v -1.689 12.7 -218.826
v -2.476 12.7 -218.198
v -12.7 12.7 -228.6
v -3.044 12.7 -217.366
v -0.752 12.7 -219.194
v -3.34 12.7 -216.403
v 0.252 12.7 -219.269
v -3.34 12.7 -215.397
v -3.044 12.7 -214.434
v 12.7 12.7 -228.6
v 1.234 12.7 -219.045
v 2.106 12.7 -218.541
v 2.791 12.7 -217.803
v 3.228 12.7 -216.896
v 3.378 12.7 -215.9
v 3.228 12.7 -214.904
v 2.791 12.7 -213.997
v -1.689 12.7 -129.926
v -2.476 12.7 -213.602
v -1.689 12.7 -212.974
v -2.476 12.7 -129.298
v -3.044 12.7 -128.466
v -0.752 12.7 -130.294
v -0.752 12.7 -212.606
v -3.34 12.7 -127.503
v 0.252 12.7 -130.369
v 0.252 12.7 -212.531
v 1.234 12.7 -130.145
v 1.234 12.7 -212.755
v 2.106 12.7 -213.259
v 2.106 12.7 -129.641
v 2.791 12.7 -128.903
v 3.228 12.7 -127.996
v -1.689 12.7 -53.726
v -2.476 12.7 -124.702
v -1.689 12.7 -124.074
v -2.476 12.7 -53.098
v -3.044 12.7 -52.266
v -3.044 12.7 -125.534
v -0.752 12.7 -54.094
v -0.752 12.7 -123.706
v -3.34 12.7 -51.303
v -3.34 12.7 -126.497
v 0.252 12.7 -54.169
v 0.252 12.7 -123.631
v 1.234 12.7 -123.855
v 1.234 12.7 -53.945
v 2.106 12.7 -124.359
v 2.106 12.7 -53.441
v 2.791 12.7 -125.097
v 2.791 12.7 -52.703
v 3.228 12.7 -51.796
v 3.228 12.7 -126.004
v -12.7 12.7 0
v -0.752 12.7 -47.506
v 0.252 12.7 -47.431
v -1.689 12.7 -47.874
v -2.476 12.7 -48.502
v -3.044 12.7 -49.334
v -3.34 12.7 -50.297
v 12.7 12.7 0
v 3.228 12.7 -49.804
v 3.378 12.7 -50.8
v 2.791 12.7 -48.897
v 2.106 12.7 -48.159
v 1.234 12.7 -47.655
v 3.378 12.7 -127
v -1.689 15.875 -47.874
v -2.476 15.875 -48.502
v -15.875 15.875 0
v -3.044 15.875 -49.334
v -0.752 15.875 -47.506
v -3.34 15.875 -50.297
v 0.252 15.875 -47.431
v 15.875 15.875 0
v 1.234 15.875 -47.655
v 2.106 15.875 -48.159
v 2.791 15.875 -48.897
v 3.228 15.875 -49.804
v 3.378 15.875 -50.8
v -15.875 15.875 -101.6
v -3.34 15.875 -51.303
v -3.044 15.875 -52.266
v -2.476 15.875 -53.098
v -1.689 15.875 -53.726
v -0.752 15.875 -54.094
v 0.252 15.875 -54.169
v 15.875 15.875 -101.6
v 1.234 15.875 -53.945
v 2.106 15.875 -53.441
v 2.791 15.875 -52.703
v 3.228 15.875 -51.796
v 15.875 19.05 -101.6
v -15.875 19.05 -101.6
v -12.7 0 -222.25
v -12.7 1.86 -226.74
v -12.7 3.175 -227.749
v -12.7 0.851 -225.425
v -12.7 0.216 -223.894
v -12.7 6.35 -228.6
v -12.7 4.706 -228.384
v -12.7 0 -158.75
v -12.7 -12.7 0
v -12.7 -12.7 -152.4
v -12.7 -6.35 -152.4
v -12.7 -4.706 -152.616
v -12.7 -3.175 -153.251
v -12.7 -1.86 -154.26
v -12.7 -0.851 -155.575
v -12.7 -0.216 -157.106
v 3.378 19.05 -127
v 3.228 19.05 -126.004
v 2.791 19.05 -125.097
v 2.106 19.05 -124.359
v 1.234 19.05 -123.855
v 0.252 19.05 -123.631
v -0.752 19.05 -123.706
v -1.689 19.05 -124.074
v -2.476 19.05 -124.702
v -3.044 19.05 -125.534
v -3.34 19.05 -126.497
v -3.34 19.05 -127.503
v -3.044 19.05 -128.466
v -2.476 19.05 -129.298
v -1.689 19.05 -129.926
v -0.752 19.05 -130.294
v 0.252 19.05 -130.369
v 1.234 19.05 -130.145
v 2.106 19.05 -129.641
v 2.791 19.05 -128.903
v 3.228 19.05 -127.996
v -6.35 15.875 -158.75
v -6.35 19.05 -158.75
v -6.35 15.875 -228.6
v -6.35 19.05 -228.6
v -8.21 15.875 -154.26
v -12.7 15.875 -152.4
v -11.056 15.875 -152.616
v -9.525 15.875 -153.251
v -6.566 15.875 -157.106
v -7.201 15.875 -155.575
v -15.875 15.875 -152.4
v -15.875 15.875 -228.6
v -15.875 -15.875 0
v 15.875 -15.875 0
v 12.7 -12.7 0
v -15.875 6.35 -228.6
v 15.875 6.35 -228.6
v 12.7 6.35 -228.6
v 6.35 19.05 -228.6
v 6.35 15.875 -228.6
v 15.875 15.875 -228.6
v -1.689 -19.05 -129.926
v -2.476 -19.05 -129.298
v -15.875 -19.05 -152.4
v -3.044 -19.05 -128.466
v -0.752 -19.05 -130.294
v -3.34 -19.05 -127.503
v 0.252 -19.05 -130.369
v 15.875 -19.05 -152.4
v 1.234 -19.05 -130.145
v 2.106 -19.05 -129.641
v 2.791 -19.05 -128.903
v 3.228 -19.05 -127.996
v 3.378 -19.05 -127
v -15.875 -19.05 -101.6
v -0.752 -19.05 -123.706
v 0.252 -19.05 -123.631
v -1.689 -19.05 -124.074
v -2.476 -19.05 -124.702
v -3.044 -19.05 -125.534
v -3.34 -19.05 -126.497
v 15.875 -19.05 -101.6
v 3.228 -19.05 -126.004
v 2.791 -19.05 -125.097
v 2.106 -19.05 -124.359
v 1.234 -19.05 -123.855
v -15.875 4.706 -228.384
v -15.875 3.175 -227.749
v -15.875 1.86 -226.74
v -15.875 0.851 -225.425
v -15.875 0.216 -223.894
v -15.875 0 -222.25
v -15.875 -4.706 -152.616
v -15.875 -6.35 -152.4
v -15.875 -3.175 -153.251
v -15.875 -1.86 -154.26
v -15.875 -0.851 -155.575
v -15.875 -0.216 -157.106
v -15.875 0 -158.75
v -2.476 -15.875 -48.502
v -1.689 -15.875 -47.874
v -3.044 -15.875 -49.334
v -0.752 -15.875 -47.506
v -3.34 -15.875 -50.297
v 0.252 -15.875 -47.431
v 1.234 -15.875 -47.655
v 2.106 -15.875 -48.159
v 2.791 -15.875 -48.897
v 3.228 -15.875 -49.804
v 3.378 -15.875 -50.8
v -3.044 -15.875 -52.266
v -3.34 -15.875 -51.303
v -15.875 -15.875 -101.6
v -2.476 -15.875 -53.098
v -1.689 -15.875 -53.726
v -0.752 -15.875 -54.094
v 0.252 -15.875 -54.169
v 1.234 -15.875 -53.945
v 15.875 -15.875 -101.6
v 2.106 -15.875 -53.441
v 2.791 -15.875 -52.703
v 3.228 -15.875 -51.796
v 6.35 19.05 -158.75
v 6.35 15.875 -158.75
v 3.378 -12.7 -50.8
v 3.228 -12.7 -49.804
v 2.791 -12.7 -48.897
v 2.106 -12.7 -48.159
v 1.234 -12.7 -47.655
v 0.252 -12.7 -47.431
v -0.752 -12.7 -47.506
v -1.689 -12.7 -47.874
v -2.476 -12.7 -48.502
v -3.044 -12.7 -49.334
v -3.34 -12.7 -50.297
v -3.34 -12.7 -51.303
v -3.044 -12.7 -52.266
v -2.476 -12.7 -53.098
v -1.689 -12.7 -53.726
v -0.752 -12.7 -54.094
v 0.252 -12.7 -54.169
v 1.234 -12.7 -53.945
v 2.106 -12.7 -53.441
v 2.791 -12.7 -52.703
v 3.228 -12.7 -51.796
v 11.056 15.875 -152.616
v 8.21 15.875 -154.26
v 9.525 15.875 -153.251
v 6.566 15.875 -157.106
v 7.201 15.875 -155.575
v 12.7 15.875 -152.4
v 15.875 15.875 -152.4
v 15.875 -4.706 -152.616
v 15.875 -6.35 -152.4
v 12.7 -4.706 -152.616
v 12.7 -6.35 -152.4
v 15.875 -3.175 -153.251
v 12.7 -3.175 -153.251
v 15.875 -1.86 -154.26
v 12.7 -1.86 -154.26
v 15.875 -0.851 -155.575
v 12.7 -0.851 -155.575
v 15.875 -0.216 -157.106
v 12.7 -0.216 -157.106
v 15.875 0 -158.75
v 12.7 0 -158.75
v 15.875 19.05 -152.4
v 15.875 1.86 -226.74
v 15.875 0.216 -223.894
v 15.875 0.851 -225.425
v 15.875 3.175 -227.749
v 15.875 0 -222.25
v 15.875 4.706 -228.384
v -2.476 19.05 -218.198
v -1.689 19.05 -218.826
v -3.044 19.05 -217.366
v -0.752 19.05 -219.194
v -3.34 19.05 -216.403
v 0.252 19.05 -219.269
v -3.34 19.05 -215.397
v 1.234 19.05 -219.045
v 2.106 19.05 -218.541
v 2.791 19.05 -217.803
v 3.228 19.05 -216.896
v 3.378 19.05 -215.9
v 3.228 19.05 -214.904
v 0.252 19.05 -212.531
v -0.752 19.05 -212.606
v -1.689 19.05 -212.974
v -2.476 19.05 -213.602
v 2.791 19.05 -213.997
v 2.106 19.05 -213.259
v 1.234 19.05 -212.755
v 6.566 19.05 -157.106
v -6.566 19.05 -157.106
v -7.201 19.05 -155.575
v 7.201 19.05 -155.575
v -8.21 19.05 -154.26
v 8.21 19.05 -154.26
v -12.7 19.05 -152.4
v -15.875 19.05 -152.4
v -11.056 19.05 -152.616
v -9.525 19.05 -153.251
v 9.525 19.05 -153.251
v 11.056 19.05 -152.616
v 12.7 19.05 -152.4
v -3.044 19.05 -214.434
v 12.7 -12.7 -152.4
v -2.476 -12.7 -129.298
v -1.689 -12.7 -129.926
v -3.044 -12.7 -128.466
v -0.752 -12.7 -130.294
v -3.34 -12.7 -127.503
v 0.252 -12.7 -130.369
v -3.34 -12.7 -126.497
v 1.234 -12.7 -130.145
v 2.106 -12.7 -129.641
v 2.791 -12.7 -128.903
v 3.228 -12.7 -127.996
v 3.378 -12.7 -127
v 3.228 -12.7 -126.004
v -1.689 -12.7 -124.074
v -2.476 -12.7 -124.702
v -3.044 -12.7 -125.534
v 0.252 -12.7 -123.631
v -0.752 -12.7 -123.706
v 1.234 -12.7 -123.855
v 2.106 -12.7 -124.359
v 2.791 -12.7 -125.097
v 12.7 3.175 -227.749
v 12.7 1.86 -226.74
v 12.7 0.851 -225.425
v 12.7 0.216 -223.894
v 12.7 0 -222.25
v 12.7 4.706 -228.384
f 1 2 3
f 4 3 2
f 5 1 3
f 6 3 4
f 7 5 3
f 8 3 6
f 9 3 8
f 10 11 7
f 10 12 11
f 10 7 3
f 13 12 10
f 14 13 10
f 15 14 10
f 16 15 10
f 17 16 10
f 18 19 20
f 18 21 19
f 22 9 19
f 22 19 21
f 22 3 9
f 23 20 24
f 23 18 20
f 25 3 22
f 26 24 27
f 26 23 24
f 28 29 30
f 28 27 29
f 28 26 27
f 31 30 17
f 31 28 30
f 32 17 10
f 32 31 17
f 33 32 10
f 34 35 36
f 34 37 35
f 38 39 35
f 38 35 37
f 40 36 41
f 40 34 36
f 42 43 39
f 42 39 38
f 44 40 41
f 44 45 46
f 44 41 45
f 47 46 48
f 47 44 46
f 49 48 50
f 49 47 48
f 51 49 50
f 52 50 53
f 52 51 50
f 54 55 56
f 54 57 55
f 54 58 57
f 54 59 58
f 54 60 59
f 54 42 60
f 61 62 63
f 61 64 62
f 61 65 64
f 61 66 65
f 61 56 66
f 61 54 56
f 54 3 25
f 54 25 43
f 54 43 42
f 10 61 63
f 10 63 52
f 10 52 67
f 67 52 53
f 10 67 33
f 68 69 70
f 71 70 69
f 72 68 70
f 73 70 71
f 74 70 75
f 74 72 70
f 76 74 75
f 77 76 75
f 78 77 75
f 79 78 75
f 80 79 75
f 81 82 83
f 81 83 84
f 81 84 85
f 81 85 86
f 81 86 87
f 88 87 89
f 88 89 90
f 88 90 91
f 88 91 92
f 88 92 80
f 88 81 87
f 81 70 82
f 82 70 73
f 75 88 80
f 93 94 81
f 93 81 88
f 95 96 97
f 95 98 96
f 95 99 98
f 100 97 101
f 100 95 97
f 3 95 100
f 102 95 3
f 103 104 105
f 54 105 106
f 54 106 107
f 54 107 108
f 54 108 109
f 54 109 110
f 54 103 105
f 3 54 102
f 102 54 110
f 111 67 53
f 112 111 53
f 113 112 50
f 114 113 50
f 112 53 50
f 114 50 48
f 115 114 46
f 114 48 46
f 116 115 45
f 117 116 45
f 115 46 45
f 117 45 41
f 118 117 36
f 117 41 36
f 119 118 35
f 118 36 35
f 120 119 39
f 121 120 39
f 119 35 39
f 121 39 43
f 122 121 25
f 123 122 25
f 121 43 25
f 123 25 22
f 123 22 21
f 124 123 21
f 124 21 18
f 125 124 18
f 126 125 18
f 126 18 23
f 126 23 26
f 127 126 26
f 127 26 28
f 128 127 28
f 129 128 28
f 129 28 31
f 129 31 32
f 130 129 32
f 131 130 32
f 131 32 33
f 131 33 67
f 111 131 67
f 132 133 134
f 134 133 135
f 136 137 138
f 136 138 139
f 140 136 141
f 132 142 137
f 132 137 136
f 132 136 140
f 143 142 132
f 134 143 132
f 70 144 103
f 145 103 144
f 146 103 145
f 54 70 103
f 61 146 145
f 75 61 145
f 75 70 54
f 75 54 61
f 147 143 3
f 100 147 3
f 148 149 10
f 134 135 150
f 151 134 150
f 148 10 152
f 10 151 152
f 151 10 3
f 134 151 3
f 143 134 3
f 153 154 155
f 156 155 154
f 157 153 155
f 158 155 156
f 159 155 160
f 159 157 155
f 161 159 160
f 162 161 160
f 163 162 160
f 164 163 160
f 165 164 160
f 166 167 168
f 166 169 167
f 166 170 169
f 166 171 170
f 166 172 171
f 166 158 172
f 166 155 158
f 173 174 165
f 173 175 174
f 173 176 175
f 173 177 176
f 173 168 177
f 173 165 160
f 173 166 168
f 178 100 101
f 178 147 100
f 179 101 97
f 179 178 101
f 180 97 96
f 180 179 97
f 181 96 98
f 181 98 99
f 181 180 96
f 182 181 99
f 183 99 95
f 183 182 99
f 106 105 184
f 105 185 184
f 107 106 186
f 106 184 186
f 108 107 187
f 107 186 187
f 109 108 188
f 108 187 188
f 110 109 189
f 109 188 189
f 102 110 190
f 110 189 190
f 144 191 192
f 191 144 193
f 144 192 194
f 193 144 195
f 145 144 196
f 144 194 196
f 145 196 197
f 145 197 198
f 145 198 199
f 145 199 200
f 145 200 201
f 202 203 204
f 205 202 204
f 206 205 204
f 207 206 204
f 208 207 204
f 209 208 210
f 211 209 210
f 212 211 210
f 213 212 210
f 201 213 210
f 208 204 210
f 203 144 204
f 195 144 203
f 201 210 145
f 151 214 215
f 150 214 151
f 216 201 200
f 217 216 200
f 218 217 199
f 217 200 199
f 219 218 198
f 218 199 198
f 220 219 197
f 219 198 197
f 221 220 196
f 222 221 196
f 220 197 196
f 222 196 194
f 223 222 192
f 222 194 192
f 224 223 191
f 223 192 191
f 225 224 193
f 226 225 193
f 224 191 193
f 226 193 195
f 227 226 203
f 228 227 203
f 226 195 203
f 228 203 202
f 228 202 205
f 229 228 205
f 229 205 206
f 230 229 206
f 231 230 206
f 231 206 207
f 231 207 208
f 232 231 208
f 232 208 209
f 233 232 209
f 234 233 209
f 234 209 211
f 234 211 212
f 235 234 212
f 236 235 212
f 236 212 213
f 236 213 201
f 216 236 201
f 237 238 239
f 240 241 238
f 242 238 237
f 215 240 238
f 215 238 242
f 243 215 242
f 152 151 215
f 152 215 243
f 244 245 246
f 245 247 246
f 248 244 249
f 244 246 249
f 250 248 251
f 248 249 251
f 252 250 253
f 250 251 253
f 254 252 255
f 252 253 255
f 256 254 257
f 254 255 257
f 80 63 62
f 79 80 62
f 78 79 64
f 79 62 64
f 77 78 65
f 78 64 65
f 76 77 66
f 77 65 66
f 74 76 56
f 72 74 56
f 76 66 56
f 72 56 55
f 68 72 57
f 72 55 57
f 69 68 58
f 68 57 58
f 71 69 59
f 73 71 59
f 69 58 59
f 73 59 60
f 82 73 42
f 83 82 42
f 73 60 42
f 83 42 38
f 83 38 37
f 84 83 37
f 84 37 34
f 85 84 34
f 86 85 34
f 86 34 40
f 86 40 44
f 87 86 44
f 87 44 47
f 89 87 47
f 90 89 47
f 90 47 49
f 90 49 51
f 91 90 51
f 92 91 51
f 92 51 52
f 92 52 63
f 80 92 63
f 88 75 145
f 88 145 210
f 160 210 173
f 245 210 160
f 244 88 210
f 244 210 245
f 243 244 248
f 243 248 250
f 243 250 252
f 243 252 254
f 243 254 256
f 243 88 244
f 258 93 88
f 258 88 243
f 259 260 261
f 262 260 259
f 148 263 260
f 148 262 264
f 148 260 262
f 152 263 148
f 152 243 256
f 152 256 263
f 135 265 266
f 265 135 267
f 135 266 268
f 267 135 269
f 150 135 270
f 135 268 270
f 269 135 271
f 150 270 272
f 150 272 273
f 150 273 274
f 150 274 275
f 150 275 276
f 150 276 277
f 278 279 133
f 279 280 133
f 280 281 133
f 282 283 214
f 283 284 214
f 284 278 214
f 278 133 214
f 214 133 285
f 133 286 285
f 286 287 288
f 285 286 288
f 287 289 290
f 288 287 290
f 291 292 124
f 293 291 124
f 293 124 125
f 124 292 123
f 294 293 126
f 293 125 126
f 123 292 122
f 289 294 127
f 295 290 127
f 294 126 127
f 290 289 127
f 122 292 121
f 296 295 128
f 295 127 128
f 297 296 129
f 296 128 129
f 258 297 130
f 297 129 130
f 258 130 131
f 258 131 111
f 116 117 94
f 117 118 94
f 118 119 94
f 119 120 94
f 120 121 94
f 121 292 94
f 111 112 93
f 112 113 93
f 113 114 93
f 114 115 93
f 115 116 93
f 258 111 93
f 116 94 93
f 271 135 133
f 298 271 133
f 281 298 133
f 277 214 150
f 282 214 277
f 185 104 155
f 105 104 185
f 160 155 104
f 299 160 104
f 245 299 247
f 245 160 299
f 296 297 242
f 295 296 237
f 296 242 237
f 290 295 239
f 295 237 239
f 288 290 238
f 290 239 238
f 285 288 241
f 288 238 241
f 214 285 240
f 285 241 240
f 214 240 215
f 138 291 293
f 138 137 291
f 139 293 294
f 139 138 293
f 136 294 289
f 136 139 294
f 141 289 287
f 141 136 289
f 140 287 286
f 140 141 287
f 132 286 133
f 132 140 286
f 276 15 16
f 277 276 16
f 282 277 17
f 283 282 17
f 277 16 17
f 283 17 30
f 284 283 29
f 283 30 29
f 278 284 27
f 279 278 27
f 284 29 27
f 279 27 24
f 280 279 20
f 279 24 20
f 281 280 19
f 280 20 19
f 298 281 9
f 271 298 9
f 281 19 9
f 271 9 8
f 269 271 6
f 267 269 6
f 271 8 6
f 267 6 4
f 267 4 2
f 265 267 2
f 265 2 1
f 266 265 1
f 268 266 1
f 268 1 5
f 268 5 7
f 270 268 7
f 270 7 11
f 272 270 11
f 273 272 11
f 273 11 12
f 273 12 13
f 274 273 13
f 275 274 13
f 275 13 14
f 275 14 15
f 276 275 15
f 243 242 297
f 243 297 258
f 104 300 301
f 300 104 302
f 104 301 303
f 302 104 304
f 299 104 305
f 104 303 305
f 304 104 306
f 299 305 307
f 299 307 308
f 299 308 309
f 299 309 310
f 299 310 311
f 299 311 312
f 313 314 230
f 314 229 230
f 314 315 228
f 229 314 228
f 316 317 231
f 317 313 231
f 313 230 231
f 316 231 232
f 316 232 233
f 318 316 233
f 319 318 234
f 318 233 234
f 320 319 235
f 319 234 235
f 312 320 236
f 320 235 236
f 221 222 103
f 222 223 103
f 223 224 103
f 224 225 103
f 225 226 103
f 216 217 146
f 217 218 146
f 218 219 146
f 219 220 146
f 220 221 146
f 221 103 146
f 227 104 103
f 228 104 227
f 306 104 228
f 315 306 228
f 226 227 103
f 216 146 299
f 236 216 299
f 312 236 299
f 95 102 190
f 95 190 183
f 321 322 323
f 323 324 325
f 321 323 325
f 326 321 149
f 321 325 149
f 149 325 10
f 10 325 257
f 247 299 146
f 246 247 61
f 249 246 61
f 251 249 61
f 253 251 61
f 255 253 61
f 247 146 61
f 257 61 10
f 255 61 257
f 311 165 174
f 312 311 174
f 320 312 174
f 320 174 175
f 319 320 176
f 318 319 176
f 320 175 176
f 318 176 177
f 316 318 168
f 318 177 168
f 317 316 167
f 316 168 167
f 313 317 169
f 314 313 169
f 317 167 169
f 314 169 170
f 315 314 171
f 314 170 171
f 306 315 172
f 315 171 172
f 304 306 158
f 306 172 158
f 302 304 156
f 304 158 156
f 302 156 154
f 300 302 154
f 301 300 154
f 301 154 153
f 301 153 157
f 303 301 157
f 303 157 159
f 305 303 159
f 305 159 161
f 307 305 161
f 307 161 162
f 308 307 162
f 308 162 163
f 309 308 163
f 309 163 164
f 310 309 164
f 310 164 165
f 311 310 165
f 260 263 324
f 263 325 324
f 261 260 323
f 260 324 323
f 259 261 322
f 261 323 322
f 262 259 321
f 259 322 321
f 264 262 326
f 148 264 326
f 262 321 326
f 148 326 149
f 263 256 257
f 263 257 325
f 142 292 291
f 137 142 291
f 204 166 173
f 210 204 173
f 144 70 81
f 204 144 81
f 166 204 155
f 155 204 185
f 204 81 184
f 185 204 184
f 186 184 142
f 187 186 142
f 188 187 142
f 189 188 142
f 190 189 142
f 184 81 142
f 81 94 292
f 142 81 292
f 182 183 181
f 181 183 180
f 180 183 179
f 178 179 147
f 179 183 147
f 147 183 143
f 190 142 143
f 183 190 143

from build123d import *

# Parameters (mm, degrees)
SKETCH1_W               = 38.1
SKETCH1_H               = 38.1
SKETCH1_W_2             = 25.4
SKETCH1_H_2             = 25.4
EXTRUDE1_DEPTH          = 228.6
F_1_4_CLEARANCE_HOLE1_D = 6.7564
SKETCH4_W               = 12.7
SKETCH4_H               = 76.2
SKETCH4_W_2             = 38.1
SKETCH4_H_2             = 101.6
EXTRUDE2_DEPTH          = 3.175
SKETCH5_W               = 228.6
SKETCH5_H               = 38.1
EXTRUDE3_DEPTH          = 3.175
FILLET2_R               = 6.35
SKETCH8_W               = 76.2
SKETCH8_H               = 19.05
EXTRUDE6_DEPTH          = 232.579198116
FILLET3_R               = 6.35
FILLET4_R               = 6.35


with BuildPart() as part:
    # Sketch1 → Extrude1 (new body)
    with BuildSketch(Plane.XY):
        Rectangle(SKETCH1_W, SKETCH1_H)
        Rectangle(SKETCH1_W_2, SKETCH1_H_2, mode=Mode.SUBTRACT)
    extrude(amount=-EXTRUDE1_DEPTH)

    # 1/4 Clearance Hole1 (through all)
    with Locations(Plane(origin=(0, 19.05, 0), x_dir=(-1, 0, 0), z_dir=(0, 1, 0))):
        with Locations((0, -215.9), (0, -50.8), (0, -127)):
            Hole(F_1_4_CLEARANCE_HOLE1_D / 2)

    # Sketch4 → Extrude2 (cut)
    with BuildSketch(Plane(origin=(0, 19.05, 0), x_dir=(1, 0, 0), z_dir=(0, 1, 0))):
        with Locations((-12.7, 190.5)):
            Rectangle(SKETCH4_W, SKETCH4_H)
        with Locations((0, 50.8)):
            Rectangle(SKETCH4_W_2, SKETCH4_H_2)
        with Locations((12.7, 190.5)):
            Rectangle(SKETCH4_W, SKETCH4_H)
    extrude2 = extrude(amount=-EXTRUDE2_DEPTH, mode=Mode.SUBTRACT)

    # Mirror1: Extrude2 across plane
    add(extrude2.mirror(Plane.ZX), mode=Mode.SUBTRACT)

    # Sketch5 → Extrude3 (cut)
    with BuildSketch(Plane(origin=(19.05, 0, 0), x_dir=(0, 0, -1), z_dir=(1, 0, 0))):
        with Locations((114.3, 0)):
            Rectangle(SKETCH5_W, SKETCH5_H)
    extrude3 = extrude(amount=-EXTRUDE3_DEPTH, mode=Mode.SUBTRACT)

    # Mirror2: Extrude3 across plane
    add(extrude3.mirror(Plane(origin=(0, 0, 0), x_dir=(0, 0, 1), z_dir=(1, 0, 0))), mode=Mode.SUBTRACT)

    # Fillet2
    fillet2_edges = [part.edges().sort_by_distance(p)[0] for p in [
        (-6.35, 17.4625, -152.4),
        (6.35, 17.4625, -152.4),
    ]]
    fillet(fillet2_edges, radius=FILLET2_R)

    # Sketch8 → Extrude6 (cut, through all)
    with BuildSketch(Plane(origin=(15.875, 0, 0), x_dir=(0, 0, -1), z_dir=(1, 0, 0))):
        with Locations((190.5, -9.525)):
            Rectangle(SKETCH8_W, SKETCH8_H)
    extrude(amount=-EXTRUDE6_DEPTH, mode=Mode.SUBTRACT)

    # Fillet3
    fillet3_edges = [part.edges().sort_by_distance(p)[0] for p in [
        (-14.2875, 0, -152.4),
        (14.2875, 0, -152.4),
    ]]
    fillet(fillet3_edges, radius=FILLET3_R)

    # Fillet4
    fillet4_edges = [part.edges().sort_by_distance(p)[0] for p in [
        (-14.2875, 0, -228.6),
        (14.2875, 0, -228.6),
    ]]
    fillet(fillet4_edges, radius=FILLET4_R)


solid = part.part
